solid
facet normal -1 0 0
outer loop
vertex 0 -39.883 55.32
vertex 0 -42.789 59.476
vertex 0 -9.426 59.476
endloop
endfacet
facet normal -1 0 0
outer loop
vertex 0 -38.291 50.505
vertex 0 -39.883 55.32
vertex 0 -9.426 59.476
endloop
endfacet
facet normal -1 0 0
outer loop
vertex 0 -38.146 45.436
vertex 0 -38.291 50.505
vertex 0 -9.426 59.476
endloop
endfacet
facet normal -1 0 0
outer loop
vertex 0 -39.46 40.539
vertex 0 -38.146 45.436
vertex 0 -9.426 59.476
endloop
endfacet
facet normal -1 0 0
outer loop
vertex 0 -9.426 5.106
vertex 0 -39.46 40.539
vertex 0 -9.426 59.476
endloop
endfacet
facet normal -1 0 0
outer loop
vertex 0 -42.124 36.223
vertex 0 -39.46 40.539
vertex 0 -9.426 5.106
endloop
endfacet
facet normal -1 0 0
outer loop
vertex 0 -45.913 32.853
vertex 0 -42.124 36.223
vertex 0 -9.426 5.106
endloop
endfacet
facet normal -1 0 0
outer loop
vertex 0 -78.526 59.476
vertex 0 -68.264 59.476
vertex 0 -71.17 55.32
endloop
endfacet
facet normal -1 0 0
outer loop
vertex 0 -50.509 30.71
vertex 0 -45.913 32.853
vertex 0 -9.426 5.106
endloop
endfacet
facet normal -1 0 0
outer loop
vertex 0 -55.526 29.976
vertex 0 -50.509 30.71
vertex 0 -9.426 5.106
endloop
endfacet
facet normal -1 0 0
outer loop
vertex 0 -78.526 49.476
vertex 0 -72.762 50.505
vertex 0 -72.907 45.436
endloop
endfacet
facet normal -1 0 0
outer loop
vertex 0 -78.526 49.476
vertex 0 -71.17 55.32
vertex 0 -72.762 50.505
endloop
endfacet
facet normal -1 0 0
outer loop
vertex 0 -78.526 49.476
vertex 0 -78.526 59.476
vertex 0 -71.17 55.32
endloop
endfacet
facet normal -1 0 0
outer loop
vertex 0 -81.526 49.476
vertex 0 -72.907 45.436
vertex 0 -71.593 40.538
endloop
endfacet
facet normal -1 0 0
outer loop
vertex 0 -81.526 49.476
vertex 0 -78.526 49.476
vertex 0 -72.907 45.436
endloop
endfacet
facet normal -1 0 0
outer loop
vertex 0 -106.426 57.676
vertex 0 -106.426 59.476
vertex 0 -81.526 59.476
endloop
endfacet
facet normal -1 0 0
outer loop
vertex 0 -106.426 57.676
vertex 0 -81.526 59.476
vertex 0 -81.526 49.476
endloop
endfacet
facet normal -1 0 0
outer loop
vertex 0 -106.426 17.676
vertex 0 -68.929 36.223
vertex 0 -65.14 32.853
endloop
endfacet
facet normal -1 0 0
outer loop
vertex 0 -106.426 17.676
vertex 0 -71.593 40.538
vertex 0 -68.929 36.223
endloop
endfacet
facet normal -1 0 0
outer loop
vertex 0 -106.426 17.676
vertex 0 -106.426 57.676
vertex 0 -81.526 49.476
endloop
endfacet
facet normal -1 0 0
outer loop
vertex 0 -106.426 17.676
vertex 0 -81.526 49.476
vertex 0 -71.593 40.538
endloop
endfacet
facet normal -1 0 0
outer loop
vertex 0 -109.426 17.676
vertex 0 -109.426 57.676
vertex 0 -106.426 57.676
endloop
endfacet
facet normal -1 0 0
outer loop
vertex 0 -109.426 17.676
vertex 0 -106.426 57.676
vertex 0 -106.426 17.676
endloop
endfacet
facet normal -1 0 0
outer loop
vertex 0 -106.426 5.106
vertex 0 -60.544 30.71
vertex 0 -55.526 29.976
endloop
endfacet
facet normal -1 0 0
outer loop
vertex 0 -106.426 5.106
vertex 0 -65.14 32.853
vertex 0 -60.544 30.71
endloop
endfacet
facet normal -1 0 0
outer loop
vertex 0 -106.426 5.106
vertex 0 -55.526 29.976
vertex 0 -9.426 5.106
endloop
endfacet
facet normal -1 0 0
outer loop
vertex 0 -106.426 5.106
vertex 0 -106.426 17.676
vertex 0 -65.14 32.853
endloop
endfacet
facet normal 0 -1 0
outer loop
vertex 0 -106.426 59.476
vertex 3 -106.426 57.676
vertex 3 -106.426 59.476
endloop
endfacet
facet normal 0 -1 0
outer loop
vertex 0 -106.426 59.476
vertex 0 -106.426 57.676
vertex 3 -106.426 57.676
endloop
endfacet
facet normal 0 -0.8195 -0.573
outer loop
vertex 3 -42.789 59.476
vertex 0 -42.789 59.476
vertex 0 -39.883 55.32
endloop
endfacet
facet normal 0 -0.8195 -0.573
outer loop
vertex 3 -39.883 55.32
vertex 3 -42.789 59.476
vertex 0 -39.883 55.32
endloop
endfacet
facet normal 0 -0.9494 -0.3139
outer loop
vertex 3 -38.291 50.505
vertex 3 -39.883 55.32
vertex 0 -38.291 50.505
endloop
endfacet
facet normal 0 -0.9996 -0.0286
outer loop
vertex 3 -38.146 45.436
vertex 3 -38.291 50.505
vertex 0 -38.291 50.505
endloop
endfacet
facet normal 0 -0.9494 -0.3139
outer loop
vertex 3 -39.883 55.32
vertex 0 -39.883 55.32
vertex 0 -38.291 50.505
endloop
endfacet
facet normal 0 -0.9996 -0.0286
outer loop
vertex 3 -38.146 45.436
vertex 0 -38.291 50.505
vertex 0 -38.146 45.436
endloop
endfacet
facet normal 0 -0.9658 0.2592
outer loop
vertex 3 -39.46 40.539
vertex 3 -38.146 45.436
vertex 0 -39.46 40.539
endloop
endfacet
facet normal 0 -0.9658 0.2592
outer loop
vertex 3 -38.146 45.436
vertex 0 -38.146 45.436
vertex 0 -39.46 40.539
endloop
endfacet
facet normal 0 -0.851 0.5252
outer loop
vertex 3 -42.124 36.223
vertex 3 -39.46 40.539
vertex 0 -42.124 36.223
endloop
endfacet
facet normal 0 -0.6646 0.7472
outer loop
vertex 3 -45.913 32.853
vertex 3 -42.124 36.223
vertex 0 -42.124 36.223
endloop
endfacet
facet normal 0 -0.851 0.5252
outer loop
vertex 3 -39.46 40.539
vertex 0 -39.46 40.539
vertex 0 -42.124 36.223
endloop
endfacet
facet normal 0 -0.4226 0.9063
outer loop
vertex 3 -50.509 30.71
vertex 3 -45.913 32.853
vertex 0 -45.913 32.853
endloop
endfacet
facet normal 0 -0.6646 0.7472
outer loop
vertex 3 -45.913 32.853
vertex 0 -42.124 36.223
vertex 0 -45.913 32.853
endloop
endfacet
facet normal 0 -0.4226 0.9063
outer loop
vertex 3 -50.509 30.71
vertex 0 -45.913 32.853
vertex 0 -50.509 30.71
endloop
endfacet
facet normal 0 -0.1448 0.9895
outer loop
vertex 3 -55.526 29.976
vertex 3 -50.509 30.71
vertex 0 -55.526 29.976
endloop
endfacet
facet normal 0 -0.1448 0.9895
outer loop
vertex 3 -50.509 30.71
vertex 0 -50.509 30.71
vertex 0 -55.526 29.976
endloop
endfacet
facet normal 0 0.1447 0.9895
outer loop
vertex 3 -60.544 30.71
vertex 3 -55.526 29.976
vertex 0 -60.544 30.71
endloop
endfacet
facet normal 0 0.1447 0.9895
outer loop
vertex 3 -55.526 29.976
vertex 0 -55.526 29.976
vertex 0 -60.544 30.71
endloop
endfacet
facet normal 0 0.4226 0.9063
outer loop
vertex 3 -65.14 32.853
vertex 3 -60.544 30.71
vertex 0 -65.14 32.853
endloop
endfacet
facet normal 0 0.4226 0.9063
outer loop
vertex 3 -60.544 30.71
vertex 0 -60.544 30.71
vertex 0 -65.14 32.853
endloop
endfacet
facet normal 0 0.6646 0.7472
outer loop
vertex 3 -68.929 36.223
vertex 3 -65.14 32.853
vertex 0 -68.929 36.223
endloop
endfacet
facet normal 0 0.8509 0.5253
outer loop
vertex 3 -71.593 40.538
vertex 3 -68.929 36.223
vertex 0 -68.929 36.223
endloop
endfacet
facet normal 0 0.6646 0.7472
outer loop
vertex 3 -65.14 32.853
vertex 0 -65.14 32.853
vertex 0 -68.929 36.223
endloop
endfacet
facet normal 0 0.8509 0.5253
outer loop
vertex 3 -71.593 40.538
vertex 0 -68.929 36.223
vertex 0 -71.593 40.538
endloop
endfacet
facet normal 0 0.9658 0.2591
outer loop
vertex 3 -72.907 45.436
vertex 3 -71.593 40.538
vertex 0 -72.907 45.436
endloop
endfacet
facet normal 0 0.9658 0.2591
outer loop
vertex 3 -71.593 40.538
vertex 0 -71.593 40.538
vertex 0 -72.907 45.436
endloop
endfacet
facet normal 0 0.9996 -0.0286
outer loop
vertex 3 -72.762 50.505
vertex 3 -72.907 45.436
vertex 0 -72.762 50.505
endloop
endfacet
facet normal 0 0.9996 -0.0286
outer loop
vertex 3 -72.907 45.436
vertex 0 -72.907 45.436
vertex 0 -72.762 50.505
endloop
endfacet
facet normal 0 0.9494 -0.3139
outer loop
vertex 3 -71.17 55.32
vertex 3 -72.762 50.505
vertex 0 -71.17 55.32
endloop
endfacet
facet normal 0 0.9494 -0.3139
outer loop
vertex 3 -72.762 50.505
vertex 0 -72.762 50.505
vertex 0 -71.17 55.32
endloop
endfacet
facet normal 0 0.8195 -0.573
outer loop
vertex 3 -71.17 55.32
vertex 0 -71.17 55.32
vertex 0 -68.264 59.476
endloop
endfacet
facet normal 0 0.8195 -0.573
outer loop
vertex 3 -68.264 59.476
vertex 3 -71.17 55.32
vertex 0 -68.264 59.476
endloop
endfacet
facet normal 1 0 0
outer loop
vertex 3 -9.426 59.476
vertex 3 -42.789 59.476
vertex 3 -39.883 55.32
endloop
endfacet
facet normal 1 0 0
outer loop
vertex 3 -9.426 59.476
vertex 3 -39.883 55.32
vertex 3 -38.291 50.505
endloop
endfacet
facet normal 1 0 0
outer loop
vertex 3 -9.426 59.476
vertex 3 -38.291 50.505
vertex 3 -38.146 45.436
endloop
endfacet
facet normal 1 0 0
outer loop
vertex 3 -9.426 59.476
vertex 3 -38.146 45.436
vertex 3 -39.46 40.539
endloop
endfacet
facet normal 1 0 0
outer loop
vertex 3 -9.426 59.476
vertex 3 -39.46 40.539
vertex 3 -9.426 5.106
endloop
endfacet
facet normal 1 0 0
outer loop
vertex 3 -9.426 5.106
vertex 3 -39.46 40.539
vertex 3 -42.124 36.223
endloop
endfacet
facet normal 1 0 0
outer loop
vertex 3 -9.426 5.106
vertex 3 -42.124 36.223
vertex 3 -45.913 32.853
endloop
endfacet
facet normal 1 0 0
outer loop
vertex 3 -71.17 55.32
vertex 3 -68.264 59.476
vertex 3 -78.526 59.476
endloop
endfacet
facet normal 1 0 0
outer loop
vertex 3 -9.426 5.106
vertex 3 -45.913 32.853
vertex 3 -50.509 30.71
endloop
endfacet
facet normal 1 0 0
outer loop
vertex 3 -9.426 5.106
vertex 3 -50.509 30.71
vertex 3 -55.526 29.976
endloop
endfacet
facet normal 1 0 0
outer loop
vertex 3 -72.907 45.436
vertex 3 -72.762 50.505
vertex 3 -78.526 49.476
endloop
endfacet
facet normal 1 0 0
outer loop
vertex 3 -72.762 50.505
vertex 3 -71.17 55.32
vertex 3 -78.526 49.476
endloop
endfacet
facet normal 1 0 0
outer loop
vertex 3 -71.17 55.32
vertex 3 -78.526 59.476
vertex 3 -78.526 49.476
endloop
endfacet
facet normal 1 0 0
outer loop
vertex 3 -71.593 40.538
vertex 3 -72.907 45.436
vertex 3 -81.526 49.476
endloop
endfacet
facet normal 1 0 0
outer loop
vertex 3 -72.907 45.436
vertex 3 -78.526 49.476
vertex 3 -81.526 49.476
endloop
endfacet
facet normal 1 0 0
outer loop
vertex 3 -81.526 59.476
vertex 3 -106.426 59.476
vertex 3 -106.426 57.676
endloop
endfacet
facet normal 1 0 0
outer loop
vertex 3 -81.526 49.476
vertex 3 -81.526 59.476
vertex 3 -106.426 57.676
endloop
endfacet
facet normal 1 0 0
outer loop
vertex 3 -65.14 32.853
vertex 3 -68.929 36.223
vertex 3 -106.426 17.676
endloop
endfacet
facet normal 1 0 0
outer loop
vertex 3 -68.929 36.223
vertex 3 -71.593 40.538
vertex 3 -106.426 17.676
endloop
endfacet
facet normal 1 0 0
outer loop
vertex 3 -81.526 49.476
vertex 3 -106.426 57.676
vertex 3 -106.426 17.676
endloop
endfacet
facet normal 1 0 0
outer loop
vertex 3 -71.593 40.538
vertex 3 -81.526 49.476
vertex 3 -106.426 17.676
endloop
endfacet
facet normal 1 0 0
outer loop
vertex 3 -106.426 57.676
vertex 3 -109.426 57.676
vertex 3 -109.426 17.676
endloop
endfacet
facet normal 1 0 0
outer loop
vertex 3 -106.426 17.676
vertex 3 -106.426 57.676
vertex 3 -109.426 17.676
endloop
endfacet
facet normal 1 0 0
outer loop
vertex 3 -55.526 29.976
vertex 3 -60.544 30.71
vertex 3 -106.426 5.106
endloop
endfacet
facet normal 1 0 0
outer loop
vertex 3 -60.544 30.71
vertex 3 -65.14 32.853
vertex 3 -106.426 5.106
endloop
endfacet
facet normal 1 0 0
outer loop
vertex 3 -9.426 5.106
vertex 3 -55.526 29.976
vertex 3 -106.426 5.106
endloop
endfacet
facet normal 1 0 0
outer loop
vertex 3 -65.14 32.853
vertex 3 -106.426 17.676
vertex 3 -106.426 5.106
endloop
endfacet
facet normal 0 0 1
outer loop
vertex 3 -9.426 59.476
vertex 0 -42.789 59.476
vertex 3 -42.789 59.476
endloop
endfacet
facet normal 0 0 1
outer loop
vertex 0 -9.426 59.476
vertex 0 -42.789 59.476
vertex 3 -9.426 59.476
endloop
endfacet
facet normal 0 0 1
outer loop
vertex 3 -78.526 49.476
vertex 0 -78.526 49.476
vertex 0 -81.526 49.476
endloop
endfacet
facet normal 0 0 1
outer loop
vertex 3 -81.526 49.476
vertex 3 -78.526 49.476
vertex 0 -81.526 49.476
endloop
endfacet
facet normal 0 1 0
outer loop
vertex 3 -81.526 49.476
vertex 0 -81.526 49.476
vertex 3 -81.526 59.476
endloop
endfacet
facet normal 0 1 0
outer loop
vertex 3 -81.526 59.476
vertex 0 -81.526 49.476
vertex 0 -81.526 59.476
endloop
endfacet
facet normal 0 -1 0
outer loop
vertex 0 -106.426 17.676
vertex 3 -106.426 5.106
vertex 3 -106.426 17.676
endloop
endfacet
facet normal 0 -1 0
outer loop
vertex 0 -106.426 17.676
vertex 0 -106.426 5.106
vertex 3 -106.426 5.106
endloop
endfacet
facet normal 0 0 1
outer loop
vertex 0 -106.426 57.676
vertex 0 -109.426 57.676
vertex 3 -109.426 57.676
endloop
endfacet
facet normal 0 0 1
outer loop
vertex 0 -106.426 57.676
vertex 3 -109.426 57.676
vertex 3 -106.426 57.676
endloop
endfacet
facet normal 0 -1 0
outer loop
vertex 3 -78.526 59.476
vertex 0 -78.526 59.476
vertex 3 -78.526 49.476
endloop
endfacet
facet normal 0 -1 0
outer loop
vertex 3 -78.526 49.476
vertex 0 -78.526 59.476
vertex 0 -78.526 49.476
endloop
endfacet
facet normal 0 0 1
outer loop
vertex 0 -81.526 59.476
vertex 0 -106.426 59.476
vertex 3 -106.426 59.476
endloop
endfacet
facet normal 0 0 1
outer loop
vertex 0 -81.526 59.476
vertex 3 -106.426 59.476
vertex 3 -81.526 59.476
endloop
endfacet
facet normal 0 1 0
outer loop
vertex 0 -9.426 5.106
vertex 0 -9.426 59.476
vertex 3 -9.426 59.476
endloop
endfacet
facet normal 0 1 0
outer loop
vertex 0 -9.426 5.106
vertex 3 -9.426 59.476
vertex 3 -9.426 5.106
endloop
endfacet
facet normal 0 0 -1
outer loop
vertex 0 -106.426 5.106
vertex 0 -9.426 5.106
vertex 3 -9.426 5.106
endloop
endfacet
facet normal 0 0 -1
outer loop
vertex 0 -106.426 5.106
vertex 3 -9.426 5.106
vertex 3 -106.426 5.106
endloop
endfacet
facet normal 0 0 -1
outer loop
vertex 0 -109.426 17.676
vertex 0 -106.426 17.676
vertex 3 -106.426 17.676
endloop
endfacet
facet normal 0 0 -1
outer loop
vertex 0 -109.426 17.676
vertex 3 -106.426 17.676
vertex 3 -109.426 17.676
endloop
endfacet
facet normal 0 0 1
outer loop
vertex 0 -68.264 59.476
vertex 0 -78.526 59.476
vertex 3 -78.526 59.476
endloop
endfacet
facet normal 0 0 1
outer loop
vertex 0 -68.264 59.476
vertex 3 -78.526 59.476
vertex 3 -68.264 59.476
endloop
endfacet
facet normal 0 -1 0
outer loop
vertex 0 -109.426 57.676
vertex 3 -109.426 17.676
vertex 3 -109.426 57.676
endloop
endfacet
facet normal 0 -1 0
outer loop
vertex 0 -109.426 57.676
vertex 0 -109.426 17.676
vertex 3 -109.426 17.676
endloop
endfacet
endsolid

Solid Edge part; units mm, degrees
sketch "Sketch1" plane through (0, 0, 0) normal (1, 0, 0) x (0, 1, 0)
  line L0 (-9.4265, 59.4757) -> (-9.4265, 5.1057)
  line L1 (-9.4265, 5.1057) -> (-106.4265, 5.1057)
  line L2 (-106.4265, 5.1057) -> (-106.4265, 17.6757)
  line L3 (-106.4265, 17.6757) -> (-109.4265, 17.6757)
  line L4 (-109.4265, 17.6757) -> (-109.4265, 57.6757)
  line L5 (-109.4265, 57.6757) -> (-106.4265, 57.6757)
  line L6 (-106.4265, 57.6757) -> (-106.4265, 59.4757)
  line L7 (-106.4265, 59.4757) -> (-81.5265, 59.4757)
  line L8 (-81.5265, 49.4757) -> (-81.5265, 59.4757)
  line L9 (-78.5265, 49.4757) -> (-81.5265, 49.4757)
  line L10 (-78.5265, 59.4757) -> (-78.5265, 49.4757)
  line L11 (-78.5265, 59.4757) -> (-68.2643, 59.4757)
  line L12 (-42.7888, 59.4757) -> (-9.4265, 59.4757)
  arc A0 (-42.7888, 59.4757) -> (-68.2643, 59.4757) centre (-55.5265, 47.4757) cw
  dimension "D1" = 40
  dimension "D2" = 54.37
  dimension "D3" = 3
  dimension "D4" = 100
  dimension "D5" = 1.8
  dimension "D6" = 35
  dimension "D7" = 12
  dimension "D8" = 50.9
  dimension "D9" = 23
  dimension "D10" = 3
  dimension "D11" = 10
extrude "Protrusion1" add sketch "Sketch1" along normal blind 3
properties material "Acier"
